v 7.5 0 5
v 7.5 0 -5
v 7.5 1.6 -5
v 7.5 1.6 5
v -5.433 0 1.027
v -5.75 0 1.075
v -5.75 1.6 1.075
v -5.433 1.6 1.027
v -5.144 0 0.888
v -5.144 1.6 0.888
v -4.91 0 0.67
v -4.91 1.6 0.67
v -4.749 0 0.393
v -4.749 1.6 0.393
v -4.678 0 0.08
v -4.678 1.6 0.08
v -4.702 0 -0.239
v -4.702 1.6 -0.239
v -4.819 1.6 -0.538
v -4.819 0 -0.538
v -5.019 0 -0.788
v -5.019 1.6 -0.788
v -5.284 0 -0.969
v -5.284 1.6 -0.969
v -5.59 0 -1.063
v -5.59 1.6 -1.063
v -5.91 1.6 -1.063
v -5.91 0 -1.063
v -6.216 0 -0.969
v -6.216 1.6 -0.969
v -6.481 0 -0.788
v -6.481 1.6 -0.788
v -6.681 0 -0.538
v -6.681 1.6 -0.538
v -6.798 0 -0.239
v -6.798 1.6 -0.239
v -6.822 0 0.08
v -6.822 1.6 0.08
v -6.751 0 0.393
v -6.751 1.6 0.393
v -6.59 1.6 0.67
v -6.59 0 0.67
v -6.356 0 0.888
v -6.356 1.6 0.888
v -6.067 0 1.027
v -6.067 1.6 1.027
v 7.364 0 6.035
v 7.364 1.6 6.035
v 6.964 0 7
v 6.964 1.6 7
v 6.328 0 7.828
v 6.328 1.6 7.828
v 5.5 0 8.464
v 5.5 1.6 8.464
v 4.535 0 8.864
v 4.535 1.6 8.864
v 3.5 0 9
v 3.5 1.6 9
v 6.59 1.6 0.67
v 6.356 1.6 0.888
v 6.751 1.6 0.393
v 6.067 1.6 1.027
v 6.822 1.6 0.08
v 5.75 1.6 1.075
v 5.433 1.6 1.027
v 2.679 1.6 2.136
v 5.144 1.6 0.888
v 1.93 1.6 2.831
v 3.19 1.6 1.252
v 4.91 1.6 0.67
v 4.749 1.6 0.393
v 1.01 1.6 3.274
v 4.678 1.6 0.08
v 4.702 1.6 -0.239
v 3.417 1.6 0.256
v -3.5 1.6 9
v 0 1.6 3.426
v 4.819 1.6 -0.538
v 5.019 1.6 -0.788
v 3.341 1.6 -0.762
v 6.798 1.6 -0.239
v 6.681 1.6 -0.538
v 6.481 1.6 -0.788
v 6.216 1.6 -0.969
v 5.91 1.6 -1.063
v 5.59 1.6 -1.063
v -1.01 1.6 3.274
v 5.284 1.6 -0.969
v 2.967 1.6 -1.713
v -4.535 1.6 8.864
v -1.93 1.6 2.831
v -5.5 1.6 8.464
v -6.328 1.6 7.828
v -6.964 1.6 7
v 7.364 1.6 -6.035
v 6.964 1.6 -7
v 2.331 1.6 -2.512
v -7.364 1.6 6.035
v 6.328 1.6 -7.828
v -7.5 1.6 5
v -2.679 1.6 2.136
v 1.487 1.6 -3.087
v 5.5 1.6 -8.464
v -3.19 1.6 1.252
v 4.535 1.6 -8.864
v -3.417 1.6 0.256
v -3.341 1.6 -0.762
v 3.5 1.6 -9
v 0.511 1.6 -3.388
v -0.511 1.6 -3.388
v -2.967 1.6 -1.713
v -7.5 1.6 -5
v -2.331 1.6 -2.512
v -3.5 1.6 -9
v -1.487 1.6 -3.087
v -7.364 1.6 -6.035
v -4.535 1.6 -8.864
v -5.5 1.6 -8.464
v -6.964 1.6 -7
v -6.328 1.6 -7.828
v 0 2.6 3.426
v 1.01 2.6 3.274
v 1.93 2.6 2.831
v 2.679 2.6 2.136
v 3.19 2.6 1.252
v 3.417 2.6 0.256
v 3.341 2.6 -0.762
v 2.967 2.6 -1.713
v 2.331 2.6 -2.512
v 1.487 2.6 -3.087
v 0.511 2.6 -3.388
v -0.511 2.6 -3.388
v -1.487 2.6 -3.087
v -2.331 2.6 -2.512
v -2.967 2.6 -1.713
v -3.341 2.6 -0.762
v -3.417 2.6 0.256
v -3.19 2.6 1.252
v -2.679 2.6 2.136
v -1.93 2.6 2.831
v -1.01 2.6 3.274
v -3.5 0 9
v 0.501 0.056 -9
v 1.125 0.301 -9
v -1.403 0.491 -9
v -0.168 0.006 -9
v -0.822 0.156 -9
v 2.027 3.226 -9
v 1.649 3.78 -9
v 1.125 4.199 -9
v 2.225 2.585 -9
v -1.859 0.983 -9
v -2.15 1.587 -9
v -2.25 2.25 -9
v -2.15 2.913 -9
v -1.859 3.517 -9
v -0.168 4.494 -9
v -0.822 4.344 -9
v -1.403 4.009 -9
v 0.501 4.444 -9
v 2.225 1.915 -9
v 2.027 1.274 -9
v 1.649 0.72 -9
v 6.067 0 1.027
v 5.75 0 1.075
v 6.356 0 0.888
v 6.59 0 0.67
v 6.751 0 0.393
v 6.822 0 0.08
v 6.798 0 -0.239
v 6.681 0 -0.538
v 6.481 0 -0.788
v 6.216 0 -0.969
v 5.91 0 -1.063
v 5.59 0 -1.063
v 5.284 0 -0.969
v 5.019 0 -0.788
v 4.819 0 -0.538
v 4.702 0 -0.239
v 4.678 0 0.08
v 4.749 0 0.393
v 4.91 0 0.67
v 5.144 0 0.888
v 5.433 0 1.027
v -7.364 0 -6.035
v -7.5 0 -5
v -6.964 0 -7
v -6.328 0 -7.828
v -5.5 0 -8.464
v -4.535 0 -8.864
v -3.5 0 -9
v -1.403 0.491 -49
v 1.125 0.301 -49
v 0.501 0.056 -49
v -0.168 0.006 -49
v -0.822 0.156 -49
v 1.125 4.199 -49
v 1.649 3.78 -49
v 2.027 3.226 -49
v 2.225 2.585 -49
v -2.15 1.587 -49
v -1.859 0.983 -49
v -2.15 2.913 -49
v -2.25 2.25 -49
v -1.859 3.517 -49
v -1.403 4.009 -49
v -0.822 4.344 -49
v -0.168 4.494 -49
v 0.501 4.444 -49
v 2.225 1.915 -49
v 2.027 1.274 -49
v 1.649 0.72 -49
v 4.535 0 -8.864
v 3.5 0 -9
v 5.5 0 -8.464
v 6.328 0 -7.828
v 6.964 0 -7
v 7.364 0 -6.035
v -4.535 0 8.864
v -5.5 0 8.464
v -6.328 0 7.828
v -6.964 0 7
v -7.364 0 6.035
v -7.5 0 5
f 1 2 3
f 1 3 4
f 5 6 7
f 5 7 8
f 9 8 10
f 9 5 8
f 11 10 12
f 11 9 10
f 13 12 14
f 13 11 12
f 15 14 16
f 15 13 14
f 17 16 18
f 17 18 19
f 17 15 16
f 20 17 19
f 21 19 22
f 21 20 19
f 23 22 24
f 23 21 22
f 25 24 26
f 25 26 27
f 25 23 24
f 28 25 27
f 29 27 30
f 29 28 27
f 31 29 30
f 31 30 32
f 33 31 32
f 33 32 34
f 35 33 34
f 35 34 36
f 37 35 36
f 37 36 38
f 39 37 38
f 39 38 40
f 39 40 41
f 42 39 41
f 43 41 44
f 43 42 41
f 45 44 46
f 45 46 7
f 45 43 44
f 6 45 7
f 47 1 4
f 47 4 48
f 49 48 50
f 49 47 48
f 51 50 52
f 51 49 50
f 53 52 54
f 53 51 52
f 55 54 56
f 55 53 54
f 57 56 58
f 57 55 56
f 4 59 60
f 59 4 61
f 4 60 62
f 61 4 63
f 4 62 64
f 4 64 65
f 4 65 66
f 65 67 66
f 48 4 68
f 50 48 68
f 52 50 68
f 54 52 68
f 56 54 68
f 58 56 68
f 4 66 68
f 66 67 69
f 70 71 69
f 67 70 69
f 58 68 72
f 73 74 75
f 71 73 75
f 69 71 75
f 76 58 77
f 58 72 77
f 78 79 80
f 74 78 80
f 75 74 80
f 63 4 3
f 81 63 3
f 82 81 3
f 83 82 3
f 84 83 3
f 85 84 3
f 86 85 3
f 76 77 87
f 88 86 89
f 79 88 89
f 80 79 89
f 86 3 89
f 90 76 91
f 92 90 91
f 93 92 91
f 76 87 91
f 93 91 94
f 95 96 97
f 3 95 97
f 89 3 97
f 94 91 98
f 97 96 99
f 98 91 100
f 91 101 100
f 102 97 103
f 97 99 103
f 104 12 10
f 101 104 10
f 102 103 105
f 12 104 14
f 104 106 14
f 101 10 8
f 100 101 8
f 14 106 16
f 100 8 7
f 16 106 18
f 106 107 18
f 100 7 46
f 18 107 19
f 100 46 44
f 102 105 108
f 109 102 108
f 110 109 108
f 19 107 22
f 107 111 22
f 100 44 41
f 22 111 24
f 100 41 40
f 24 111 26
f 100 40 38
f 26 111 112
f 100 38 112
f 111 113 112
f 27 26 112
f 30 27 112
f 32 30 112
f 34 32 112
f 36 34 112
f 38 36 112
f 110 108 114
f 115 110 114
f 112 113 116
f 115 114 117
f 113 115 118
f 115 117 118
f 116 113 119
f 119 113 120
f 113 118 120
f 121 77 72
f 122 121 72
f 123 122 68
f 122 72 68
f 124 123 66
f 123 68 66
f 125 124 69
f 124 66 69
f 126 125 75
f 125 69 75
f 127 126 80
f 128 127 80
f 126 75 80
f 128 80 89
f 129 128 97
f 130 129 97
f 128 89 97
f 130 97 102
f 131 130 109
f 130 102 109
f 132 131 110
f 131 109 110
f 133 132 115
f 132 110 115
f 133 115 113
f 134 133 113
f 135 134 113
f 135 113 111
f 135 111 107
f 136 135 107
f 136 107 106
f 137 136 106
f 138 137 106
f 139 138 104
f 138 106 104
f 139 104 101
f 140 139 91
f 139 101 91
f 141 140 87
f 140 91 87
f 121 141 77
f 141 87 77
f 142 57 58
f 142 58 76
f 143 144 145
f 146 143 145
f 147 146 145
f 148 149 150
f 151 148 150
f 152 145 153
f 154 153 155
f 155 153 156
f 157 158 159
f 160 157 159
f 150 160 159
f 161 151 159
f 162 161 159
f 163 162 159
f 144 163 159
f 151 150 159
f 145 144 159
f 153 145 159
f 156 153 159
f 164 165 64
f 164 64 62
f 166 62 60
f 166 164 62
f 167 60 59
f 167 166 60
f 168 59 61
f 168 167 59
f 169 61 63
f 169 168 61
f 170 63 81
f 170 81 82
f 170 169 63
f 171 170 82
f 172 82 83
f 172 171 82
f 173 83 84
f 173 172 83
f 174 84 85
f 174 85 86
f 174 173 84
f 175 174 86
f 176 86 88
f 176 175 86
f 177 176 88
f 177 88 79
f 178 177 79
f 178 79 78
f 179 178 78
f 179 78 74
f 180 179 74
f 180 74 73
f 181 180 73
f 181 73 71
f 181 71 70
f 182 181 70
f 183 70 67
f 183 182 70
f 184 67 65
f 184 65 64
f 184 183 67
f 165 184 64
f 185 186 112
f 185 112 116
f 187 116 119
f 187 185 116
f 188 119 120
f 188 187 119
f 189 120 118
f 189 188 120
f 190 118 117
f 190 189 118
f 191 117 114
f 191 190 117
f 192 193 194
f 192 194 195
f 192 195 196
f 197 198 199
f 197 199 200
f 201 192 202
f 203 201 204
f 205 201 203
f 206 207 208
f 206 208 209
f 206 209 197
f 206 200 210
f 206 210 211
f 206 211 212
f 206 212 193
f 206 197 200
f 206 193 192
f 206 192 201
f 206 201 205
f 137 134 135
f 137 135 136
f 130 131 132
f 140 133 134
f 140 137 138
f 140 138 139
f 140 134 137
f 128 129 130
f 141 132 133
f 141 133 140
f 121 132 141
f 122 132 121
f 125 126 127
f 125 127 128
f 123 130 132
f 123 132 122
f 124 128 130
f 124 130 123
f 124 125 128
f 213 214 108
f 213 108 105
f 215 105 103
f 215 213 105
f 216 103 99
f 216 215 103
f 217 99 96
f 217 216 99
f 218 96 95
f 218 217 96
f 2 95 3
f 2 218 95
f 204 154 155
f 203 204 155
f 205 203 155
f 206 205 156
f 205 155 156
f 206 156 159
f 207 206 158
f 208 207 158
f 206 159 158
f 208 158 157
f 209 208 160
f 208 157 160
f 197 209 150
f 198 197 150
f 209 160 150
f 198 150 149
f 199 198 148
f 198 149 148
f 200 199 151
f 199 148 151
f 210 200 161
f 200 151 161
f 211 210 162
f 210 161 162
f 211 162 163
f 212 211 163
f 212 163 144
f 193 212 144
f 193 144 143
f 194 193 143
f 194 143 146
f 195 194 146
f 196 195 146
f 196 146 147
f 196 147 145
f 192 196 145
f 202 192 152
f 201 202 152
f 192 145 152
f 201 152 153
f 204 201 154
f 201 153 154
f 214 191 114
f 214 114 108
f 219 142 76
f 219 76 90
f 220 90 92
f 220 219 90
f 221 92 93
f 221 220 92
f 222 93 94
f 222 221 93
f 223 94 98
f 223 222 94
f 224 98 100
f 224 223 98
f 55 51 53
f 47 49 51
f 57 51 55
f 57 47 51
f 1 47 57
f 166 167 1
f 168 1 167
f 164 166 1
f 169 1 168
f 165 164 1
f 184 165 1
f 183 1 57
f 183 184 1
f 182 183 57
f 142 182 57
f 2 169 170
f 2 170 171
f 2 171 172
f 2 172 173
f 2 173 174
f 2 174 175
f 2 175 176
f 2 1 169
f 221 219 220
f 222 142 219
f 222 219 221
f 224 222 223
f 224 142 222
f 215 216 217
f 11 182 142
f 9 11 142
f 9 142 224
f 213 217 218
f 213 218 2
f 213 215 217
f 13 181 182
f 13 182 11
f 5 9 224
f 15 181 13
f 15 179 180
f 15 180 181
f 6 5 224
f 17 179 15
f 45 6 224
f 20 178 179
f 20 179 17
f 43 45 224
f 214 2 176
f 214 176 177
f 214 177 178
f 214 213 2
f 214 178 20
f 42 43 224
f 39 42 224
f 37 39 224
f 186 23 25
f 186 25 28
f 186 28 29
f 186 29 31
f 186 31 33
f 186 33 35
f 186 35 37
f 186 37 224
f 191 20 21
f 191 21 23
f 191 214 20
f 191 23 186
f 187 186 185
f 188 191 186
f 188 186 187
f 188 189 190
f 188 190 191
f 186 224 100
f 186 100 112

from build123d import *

# Parameters (mm, degrees)
SKETCH1_R           = 1.075
BOSS_EXTRUDE1_DEPTH = 1.6
SKETCH2_R           = 3.426475787
BOSS_EXTRUDE2_DEPTH = 1
SKETCH4_R           = 2.25
BOSS_EXTRUDE3_DEPTH = 40


with BuildPart() as part:
    # Sketch1 → Boss-Extrude1 (new body)
    with BuildSketch(Plane(origin=(0, 0, 0), x_dir=(1, 0, 0), z_dir=(0, 1, 0))):
        with BuildLine():
            Line((-3.5, 9), (3.5, 9))
            ThreePointArc((3.5, 9), (6.328427125, 7.828427125), (7.5, 5))
            Line((7.5, 5), (7.5, -5))
            ThreePointArc((7.5, -5), (6.328427125, -7.828427125), (3.5, -9))
            Line((3.5, -9), (-3.5, -9))
            ThreePointArc((-3.5, -9), (-6.328427125, -7.828427125), (-7.5, -5))
            Line((-7.5, -5), (-7.5, 5))
            ThreePointArc((-7.5, 5), (-6.328427125, 7.828427125), (-3.5, 9))
        make_face()
        with Locations(Location((-5.75, 0, 0), (0, 0, 270))):
            Circle(SKETCH1_R, mode=Mode.SUBTRACT)
        with Locations(Location((5.75, 0, 0), (0, 0, 270))):
            Circle(SKETCH1_R, mode=Mode.SUBTRACT)
    extrude(amount=BOSS_EXTRUDE1_DEPTH)

    # Sketch2 → Boss-Extrude2 (add)
    with BuildSketch(Plane(origin=(0, 1.6, 0), x_dir=(1, 0, 0), z_dir=(0, 1, 0))):
        with Locations(Location((0, 0, 0), (0, 0, 270))):
            Circle(SKETCH2_R)
    extrude(amount=BOSS_EXTRUDE2_DEPTH)


with BuildPart() as body_2:
    # Sketch4 → Boss-Extrude3 (new body)
    with BuildSketch(Plane(origin=(0, 0, -9), x_dir=(-1, 0, 0), z_dir=(0, 0, -1))):
        with Locations((0, 2.25)):
            Circle(SKETCH4_R)
    extrude(amount=BOSS_EXTRUDE3_DEPTH)


solid = Compound([part.part, body_2.part])
